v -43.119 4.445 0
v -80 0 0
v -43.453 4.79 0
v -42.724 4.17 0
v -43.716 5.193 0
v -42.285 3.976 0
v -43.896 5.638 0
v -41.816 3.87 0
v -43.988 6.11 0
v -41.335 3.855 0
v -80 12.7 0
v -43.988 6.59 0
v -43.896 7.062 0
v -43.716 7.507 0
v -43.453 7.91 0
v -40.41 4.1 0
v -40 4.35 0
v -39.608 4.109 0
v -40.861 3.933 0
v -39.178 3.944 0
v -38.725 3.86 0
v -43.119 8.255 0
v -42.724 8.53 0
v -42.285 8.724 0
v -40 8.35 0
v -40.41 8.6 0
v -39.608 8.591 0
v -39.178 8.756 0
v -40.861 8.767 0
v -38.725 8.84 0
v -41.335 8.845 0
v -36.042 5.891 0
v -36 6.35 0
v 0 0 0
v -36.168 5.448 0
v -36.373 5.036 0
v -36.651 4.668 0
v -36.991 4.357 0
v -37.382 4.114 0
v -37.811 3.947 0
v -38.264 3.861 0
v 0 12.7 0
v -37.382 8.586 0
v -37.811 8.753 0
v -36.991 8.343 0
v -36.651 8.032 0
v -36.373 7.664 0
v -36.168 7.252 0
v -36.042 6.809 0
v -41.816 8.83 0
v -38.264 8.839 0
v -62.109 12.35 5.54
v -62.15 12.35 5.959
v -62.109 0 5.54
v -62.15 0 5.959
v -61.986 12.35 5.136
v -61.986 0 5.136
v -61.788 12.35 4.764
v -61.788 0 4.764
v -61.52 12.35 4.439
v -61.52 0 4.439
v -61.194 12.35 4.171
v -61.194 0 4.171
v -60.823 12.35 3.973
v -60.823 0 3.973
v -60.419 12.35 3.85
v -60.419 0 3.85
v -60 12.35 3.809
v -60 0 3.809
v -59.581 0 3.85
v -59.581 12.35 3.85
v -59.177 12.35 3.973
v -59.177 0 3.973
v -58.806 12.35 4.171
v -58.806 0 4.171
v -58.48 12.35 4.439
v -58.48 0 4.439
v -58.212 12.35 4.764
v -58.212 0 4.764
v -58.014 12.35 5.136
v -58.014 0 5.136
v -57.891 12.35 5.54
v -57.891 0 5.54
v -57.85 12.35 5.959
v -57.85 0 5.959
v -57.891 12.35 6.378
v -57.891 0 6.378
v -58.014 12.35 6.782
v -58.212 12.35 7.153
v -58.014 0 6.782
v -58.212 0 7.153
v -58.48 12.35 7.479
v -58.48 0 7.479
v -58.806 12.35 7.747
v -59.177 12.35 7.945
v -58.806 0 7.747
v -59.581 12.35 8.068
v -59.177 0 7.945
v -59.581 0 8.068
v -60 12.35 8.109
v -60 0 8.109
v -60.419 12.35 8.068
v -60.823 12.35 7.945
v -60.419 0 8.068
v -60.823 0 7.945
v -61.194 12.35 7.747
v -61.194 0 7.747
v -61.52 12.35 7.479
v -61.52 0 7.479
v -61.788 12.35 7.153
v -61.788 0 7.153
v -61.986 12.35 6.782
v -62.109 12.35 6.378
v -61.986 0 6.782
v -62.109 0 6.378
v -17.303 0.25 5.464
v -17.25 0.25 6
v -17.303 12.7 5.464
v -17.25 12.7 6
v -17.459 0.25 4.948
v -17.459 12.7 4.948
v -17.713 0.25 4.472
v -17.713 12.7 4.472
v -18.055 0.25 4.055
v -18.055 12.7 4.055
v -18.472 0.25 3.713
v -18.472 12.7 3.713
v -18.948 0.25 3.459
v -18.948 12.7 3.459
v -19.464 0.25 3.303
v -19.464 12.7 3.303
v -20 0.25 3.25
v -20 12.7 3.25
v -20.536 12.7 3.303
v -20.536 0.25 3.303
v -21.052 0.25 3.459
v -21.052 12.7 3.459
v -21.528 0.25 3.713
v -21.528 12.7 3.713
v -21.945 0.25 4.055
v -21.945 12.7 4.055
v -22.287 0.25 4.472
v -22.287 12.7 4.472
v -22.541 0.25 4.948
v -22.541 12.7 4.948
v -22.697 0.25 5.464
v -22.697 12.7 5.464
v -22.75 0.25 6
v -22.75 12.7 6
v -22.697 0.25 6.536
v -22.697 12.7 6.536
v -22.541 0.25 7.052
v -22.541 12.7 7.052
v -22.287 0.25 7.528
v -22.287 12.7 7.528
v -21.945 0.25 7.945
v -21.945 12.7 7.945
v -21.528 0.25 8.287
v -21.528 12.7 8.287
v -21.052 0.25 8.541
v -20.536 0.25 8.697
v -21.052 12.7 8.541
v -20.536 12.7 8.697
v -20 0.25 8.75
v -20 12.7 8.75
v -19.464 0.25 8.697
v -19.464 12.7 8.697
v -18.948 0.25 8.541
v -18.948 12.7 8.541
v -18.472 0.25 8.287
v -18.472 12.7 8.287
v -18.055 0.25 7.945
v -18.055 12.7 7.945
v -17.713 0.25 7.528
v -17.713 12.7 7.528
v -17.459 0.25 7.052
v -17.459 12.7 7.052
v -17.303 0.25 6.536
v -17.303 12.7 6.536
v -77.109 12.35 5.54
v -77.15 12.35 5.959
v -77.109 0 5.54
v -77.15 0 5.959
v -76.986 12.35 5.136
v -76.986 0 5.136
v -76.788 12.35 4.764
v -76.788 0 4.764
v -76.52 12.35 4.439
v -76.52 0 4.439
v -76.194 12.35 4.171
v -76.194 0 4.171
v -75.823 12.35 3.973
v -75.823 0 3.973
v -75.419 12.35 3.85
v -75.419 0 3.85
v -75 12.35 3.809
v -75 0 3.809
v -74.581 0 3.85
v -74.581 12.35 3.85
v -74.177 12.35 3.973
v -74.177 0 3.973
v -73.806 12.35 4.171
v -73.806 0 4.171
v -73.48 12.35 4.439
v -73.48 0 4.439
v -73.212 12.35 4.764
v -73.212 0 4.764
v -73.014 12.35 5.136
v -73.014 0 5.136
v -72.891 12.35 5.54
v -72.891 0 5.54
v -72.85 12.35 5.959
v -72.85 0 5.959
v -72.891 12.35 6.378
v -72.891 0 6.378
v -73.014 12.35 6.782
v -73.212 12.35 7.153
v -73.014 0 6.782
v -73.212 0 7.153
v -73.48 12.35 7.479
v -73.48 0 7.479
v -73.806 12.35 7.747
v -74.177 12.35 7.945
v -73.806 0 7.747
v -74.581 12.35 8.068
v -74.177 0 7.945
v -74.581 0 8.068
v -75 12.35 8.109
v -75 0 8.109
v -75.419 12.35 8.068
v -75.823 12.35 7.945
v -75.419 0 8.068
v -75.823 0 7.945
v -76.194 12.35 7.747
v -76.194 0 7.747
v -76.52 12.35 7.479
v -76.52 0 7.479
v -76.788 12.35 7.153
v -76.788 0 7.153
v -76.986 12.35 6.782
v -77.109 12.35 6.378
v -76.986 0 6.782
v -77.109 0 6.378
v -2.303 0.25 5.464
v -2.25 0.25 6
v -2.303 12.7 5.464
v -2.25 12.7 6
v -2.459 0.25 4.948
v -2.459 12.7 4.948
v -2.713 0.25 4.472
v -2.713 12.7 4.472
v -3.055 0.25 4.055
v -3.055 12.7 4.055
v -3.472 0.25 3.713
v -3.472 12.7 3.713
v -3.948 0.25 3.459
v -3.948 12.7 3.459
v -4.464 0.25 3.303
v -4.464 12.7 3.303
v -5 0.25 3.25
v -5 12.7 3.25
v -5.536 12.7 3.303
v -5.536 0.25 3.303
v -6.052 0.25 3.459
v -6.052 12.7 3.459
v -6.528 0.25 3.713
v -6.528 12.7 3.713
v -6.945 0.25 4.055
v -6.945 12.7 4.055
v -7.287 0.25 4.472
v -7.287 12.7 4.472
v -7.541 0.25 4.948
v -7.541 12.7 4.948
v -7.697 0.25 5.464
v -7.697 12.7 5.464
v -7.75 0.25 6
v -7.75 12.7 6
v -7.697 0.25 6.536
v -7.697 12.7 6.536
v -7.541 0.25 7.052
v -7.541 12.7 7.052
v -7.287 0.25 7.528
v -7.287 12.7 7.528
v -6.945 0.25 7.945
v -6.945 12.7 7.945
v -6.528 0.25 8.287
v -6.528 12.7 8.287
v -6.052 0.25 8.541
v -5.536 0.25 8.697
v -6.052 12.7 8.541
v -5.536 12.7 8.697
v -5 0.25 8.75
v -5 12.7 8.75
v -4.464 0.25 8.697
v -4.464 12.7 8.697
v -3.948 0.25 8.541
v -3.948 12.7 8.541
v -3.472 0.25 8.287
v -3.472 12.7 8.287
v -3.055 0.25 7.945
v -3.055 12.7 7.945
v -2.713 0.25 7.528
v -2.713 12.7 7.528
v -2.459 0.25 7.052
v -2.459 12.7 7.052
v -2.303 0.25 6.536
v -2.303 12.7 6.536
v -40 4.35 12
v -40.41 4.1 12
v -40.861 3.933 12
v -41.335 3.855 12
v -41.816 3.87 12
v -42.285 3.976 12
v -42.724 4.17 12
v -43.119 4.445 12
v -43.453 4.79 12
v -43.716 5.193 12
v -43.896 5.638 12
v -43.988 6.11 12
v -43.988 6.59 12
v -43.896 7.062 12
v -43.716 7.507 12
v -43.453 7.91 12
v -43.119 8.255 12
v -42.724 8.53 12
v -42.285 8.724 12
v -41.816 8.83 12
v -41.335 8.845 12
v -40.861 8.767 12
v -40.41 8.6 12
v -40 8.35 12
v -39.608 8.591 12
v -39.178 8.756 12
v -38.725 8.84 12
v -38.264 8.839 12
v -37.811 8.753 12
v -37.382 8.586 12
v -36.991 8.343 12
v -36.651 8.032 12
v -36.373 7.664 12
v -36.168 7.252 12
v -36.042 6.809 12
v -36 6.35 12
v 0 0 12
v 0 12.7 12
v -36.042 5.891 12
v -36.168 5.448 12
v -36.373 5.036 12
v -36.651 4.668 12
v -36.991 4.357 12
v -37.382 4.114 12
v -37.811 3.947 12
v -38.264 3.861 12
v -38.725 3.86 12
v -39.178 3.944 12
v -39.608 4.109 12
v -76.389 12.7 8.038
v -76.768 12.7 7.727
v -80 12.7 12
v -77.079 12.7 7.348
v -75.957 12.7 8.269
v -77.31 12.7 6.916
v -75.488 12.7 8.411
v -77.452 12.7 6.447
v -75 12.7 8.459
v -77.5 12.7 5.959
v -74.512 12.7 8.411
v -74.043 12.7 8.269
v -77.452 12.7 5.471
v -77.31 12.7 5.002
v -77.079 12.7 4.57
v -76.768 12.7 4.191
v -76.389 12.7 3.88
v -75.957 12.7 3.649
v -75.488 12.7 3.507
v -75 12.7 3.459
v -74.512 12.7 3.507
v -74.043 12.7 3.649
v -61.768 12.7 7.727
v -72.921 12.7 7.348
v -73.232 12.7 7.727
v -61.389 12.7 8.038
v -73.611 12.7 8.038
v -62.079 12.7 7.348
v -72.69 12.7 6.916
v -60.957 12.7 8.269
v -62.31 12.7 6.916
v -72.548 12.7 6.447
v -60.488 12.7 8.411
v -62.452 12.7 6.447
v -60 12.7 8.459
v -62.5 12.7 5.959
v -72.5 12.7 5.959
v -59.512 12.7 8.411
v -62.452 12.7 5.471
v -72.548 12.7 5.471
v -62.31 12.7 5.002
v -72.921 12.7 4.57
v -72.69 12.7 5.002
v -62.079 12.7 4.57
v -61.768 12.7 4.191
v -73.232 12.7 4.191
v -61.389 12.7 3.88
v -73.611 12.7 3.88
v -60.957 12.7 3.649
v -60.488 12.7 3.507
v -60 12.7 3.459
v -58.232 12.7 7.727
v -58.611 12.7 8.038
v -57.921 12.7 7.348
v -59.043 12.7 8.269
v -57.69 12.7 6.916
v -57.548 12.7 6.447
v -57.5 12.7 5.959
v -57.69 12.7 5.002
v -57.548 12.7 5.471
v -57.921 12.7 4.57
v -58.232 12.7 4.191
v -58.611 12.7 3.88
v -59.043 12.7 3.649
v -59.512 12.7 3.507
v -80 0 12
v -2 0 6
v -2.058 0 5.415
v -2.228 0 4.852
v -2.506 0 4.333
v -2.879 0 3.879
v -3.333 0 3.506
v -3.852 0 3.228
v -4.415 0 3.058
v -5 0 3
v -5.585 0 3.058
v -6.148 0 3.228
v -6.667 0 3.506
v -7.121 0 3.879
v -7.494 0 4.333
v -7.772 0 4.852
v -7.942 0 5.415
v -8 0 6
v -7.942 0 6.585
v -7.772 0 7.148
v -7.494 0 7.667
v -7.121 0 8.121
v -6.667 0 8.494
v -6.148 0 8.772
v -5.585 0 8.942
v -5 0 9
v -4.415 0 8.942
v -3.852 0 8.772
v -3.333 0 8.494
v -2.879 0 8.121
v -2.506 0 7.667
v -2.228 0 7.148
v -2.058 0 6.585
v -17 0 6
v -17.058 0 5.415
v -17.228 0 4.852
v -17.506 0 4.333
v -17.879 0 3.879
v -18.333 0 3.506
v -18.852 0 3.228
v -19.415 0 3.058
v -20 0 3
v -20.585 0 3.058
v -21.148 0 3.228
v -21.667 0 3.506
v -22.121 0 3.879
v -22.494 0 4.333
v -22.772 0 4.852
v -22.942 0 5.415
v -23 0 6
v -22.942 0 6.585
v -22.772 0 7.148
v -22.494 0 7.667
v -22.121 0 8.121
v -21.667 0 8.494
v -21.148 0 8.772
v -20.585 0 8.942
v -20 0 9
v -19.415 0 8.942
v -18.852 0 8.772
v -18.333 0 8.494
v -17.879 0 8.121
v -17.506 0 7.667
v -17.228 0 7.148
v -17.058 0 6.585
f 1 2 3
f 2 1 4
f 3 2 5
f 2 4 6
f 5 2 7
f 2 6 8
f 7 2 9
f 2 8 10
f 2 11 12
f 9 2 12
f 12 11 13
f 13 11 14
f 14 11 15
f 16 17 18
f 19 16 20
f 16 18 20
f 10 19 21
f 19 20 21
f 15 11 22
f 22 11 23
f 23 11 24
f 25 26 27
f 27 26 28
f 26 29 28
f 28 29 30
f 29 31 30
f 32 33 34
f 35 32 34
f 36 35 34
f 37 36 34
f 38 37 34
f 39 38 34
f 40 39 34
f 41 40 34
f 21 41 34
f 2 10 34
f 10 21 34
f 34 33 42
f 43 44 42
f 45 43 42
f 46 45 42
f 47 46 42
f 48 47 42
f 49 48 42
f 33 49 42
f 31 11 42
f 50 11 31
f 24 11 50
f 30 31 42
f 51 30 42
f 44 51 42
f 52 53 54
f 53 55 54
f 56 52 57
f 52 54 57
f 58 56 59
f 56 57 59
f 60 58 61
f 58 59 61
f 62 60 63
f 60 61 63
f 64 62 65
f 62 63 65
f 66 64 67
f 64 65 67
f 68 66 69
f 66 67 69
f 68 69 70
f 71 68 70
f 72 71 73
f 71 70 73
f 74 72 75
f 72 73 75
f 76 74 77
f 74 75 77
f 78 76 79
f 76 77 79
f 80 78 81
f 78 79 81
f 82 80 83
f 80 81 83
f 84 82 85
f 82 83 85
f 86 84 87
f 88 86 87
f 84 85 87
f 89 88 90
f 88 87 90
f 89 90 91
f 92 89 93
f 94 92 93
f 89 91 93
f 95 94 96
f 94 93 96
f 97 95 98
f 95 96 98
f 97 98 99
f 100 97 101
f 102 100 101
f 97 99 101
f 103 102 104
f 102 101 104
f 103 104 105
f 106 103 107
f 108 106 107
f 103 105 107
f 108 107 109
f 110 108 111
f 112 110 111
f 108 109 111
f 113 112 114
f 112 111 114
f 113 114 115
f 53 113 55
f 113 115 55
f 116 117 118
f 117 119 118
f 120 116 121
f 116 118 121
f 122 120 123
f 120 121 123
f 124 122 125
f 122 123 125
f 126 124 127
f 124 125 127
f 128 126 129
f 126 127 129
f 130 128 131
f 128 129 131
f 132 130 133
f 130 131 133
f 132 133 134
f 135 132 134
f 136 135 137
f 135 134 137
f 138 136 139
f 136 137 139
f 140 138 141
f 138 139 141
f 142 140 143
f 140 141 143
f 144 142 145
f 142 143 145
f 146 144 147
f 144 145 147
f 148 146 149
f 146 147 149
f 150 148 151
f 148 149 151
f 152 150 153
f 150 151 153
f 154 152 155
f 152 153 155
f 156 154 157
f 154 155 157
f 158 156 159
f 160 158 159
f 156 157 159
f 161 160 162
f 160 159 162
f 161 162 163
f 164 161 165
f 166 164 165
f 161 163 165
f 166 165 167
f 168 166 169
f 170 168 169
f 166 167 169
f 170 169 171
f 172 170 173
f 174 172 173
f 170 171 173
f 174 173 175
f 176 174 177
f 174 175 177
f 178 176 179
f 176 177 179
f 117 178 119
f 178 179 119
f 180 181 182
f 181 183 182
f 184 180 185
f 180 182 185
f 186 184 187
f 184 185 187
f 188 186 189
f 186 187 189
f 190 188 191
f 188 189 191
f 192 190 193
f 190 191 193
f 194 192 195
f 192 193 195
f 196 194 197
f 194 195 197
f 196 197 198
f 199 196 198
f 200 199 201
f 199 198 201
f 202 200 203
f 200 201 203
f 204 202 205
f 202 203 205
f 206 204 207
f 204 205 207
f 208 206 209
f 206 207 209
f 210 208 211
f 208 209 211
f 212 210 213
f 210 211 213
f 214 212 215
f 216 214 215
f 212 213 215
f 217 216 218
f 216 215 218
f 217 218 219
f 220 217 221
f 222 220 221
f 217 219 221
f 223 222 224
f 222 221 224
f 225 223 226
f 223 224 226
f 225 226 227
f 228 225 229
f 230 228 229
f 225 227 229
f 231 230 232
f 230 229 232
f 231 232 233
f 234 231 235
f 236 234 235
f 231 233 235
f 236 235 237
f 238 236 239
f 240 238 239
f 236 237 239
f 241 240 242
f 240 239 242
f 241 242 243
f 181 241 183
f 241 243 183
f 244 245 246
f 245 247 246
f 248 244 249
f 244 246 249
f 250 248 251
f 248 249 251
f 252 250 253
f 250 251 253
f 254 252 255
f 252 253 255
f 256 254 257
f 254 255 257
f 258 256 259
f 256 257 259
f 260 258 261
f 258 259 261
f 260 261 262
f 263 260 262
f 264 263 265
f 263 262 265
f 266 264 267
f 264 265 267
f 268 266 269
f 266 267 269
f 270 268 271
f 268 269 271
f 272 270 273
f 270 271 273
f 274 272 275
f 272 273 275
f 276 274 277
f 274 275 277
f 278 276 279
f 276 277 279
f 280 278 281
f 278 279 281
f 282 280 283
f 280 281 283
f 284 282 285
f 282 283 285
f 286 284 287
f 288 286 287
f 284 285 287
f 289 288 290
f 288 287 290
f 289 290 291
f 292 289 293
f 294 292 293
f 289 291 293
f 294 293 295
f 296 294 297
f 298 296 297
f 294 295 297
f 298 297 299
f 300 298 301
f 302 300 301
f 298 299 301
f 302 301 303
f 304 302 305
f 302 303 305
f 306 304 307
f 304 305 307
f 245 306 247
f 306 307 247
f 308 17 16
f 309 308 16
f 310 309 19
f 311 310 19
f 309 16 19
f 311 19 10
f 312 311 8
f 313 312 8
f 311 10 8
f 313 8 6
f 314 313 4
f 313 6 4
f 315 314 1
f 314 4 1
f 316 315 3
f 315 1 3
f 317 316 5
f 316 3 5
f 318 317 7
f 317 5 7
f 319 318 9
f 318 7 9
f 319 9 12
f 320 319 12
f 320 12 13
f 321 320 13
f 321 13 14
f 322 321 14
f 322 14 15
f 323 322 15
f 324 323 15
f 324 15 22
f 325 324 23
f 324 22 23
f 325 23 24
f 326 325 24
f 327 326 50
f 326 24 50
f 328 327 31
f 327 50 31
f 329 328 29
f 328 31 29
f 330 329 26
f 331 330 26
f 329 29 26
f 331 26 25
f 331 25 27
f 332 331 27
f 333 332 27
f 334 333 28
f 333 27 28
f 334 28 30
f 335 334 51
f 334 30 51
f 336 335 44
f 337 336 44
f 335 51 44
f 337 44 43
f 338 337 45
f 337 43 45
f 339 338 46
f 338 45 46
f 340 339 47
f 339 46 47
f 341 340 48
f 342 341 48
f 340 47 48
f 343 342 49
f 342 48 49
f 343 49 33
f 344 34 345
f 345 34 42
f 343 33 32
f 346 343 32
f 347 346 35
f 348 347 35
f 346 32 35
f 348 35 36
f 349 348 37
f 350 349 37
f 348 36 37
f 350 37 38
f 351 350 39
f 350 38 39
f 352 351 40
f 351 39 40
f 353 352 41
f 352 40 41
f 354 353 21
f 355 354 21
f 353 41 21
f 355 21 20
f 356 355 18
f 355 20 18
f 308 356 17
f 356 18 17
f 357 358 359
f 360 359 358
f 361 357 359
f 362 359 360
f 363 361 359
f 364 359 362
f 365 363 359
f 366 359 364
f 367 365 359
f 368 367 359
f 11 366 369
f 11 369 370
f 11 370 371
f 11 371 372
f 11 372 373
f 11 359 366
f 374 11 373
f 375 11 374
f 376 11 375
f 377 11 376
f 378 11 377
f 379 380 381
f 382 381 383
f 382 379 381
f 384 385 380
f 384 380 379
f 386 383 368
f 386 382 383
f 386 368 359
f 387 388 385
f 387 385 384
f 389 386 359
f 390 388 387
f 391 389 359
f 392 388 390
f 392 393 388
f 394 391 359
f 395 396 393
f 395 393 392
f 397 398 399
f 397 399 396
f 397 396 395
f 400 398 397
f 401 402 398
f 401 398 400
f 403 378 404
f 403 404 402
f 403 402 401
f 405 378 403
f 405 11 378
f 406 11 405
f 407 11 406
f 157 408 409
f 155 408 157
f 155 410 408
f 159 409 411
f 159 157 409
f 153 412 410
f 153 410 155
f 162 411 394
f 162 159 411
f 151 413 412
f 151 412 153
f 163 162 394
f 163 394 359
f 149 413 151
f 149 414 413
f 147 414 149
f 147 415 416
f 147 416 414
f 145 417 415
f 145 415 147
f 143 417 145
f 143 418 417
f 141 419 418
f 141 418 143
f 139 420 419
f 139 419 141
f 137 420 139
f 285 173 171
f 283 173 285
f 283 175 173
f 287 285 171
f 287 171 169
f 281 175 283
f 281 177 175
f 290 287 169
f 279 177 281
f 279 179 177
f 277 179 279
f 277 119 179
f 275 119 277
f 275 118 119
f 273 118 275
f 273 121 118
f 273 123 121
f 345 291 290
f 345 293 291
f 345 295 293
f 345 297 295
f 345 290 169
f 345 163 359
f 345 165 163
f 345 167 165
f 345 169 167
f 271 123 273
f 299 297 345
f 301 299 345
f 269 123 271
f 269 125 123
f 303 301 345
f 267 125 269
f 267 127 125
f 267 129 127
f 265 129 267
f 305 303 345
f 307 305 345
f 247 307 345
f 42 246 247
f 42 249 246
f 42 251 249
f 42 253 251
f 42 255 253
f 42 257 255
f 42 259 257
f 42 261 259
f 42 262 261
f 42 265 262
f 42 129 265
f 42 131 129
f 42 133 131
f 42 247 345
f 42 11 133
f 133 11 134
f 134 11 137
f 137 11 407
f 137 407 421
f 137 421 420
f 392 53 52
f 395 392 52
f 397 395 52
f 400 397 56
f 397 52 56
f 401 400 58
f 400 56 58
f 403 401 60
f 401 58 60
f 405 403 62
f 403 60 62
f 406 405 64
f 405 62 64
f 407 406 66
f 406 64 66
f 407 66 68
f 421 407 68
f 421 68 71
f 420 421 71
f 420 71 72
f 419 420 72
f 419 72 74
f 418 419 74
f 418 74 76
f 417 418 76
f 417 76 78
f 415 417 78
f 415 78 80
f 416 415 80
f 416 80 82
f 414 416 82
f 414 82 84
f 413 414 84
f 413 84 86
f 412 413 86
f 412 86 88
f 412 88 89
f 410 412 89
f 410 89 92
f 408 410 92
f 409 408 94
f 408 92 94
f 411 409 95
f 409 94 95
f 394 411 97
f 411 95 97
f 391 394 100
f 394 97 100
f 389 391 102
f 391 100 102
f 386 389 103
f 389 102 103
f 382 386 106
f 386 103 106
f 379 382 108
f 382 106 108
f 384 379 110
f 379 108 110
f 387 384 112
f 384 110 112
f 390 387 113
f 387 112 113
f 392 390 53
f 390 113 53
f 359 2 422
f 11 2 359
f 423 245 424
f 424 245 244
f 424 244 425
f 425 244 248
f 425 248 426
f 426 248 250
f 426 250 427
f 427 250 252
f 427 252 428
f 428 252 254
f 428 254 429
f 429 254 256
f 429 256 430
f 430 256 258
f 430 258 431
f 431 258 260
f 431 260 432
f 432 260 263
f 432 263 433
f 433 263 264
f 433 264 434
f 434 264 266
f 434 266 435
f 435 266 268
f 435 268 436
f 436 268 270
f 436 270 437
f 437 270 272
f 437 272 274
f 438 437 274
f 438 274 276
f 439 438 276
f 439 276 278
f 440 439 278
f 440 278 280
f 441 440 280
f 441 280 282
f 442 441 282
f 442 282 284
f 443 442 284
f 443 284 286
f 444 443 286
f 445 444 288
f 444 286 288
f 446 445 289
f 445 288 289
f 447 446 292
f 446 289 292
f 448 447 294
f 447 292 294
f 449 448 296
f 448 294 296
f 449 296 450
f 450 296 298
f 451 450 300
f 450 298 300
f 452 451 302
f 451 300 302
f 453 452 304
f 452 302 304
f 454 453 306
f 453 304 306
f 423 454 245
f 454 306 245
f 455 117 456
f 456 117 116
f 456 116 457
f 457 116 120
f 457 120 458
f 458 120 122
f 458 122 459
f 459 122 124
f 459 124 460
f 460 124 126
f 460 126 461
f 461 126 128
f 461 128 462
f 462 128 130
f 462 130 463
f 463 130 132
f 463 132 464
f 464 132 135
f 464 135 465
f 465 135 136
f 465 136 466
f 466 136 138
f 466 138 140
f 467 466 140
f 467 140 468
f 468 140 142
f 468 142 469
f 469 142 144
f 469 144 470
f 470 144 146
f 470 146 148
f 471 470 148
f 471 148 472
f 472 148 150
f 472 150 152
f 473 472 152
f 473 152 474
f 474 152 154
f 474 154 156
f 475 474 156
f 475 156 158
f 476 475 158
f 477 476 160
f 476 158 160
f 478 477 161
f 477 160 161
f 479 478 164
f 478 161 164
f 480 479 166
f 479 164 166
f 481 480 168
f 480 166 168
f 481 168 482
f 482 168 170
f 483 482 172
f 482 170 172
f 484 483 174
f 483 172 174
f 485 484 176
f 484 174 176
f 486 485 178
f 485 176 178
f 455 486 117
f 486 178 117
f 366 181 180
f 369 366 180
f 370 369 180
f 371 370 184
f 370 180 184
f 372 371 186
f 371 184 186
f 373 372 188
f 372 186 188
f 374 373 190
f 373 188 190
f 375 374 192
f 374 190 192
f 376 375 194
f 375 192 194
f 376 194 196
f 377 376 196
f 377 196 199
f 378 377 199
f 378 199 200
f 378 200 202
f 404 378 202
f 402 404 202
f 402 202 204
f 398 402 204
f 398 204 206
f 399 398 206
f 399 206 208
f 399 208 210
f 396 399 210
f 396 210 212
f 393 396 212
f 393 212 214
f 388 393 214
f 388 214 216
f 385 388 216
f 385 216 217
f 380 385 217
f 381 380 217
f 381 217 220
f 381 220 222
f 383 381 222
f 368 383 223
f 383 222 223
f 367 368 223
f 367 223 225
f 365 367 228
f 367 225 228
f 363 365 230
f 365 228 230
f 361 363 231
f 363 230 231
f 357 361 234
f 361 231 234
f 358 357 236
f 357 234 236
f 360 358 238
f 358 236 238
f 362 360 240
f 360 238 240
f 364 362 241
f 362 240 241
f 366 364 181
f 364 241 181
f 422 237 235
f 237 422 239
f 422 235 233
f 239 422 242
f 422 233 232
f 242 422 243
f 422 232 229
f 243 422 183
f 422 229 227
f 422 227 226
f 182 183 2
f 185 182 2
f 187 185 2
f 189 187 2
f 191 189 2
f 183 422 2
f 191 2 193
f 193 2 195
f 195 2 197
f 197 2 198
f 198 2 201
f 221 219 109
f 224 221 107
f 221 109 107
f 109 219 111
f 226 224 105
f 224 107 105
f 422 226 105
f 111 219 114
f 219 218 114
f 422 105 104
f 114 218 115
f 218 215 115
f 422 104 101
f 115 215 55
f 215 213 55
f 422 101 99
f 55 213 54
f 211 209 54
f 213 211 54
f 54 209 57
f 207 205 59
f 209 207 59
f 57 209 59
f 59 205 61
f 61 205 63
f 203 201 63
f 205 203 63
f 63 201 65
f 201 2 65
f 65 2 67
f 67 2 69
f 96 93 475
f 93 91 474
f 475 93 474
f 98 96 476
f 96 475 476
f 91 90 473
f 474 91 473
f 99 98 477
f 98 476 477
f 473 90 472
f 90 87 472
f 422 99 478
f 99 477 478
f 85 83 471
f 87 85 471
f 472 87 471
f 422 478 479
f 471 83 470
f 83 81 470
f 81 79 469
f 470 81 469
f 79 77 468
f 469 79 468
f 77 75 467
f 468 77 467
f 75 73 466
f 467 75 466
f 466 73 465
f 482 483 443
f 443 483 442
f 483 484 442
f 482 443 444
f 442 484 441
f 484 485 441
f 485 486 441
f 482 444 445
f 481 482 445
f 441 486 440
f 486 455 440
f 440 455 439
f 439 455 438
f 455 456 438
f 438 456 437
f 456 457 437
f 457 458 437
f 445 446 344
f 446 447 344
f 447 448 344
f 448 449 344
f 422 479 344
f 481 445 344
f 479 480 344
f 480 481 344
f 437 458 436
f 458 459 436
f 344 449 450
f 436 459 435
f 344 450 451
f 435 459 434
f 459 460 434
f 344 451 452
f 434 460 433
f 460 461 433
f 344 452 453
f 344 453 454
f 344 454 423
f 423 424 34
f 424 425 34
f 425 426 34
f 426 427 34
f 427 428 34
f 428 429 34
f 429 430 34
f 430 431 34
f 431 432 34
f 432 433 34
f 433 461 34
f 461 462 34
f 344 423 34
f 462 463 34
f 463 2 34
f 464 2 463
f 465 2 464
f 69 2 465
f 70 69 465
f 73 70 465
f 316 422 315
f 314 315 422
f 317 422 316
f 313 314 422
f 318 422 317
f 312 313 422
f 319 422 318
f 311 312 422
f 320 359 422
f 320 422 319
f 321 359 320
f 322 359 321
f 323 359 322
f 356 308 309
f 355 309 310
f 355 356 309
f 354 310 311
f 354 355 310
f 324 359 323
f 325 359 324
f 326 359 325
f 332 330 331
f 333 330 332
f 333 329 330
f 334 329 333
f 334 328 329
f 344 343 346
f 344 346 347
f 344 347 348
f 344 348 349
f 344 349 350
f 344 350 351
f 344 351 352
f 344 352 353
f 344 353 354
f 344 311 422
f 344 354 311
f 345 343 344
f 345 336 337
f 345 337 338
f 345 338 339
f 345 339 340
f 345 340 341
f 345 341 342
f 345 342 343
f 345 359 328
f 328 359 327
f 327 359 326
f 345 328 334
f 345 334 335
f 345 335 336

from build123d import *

# Parameters (mm, degrees)
SKETCH1_W                                       = 80
SKETCH1_H                                       = 12.7
BASE_SHAPE_DEPTH                                = 12
CSK_FOR_M4_FLAT_HEAD_MACHINE_SCREW1_D           = 4.3
CSK_FOR_M4_FLAT_HEAD_MACHINE_SCREW1_CSINK_D     = 5
CSK_FOR_M4_FLAT_HEAD_MACHINE_SCREW1_CSINK_ANGLE = 90
CSK_FOR_M5_COUNTERSUNK_FLAT_HEAD1_D             = 5.5
CSK_FOR_M5_COUNTERSUNK_FLAT_HEAD1_CSINK_D       = 6
CSK_FOR_M5_COUNTERSUNK_FLAT_HEAD1_CSINK_ANGLE   = 90


with BuildPart() as part:
    # Sketch1 → Base Shape (new body)
    with BuildSketch(Plane.XY):
        with Locations((-40, 6.35)):
            Rectangle(SKETCH1_W, SKETCH1_H)
        with BuildLine():
            ThreePointArc((-40, 4.35), (-44, 6.35), (-40, 8.35))
            ThreePointArc((-40, 8.35), (-37.381966011, 8.586067977), (-36, 6.35))
            ThreePointArc((-36, 6.35), (-37.381966011, 4.113932023), (-40, 4.35))
        make_face(mode=Mode.SUBTRACT)
    extrude(amount=BASE_SHAPE_DEPTH)

    # CSK for M4 Flat Head Machine Screw1 (through all)
    with Locations(Plane(origin=(0, 12.7, 0), x_dir=(1, 0, 0), z_dir=(0, 1, 0))):
        with Locations((-75, -5.958952658), (-60, -5.958952658)):
            CounterSinkHole(CSK_FOR_M4_FLAT_HEAD_MACHINE_SCREW1_D / 2, CSK_FOR_M4_FLAT_HEAD_MACHINE_SCREW1_CSINK_D / 2, counter_sink_angle=CSK_FOR_M4_FLAT_HEAD_MACHINE_SCREW1_CSINK_ANGLE)

    # CSK for M5 Countersunk Flat Head1 (through all)
    with Locations(Plane(origin=(0, 0, 0), x_dir=(-1, 0, 0), z_dir=(0, -1, 0))):
        with Locations((20, -6), (5, -6)):
            CounterSinkHole(CSK_FOR_M5_COUNTERSUNK_FLAT_HEAD1_D / 2, CSK_FOR_M5_COUNTERSUNK_FLAT_HEAD1_CSINK_D / 2, counter_sink_angle=CSK_FOR_M5_COUNTERSUNK_FLAT_HEAD1_CSINK_ANGLE)


solid = part.part
